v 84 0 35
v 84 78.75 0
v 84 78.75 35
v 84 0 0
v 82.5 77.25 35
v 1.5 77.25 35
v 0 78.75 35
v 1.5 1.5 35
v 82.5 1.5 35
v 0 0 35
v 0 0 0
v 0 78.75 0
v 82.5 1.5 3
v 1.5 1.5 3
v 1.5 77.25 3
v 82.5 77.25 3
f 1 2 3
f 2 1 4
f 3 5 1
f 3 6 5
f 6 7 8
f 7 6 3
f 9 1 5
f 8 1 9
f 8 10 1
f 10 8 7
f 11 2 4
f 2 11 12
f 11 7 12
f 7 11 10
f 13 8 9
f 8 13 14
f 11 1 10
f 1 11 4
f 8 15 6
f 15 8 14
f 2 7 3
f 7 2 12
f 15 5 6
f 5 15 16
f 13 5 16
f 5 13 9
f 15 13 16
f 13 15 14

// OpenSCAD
sfp_col=4;
sfp_row=5;



x=sfp_col*19.75+5;
y=sfp_row*14.75+5;

module shell(){
    h=35;
    w=1.5;
    translate([0,0,0]){
cube([x,w,h]);
cube([w,y,h]);
translate([0,y-w,0]){
cube([x,w,h]);
}
translate([x-w,0,0]){
cube([w,y,h]);
}
}
}
shell();
color([1,0,0])
cube([x,y,3]);
